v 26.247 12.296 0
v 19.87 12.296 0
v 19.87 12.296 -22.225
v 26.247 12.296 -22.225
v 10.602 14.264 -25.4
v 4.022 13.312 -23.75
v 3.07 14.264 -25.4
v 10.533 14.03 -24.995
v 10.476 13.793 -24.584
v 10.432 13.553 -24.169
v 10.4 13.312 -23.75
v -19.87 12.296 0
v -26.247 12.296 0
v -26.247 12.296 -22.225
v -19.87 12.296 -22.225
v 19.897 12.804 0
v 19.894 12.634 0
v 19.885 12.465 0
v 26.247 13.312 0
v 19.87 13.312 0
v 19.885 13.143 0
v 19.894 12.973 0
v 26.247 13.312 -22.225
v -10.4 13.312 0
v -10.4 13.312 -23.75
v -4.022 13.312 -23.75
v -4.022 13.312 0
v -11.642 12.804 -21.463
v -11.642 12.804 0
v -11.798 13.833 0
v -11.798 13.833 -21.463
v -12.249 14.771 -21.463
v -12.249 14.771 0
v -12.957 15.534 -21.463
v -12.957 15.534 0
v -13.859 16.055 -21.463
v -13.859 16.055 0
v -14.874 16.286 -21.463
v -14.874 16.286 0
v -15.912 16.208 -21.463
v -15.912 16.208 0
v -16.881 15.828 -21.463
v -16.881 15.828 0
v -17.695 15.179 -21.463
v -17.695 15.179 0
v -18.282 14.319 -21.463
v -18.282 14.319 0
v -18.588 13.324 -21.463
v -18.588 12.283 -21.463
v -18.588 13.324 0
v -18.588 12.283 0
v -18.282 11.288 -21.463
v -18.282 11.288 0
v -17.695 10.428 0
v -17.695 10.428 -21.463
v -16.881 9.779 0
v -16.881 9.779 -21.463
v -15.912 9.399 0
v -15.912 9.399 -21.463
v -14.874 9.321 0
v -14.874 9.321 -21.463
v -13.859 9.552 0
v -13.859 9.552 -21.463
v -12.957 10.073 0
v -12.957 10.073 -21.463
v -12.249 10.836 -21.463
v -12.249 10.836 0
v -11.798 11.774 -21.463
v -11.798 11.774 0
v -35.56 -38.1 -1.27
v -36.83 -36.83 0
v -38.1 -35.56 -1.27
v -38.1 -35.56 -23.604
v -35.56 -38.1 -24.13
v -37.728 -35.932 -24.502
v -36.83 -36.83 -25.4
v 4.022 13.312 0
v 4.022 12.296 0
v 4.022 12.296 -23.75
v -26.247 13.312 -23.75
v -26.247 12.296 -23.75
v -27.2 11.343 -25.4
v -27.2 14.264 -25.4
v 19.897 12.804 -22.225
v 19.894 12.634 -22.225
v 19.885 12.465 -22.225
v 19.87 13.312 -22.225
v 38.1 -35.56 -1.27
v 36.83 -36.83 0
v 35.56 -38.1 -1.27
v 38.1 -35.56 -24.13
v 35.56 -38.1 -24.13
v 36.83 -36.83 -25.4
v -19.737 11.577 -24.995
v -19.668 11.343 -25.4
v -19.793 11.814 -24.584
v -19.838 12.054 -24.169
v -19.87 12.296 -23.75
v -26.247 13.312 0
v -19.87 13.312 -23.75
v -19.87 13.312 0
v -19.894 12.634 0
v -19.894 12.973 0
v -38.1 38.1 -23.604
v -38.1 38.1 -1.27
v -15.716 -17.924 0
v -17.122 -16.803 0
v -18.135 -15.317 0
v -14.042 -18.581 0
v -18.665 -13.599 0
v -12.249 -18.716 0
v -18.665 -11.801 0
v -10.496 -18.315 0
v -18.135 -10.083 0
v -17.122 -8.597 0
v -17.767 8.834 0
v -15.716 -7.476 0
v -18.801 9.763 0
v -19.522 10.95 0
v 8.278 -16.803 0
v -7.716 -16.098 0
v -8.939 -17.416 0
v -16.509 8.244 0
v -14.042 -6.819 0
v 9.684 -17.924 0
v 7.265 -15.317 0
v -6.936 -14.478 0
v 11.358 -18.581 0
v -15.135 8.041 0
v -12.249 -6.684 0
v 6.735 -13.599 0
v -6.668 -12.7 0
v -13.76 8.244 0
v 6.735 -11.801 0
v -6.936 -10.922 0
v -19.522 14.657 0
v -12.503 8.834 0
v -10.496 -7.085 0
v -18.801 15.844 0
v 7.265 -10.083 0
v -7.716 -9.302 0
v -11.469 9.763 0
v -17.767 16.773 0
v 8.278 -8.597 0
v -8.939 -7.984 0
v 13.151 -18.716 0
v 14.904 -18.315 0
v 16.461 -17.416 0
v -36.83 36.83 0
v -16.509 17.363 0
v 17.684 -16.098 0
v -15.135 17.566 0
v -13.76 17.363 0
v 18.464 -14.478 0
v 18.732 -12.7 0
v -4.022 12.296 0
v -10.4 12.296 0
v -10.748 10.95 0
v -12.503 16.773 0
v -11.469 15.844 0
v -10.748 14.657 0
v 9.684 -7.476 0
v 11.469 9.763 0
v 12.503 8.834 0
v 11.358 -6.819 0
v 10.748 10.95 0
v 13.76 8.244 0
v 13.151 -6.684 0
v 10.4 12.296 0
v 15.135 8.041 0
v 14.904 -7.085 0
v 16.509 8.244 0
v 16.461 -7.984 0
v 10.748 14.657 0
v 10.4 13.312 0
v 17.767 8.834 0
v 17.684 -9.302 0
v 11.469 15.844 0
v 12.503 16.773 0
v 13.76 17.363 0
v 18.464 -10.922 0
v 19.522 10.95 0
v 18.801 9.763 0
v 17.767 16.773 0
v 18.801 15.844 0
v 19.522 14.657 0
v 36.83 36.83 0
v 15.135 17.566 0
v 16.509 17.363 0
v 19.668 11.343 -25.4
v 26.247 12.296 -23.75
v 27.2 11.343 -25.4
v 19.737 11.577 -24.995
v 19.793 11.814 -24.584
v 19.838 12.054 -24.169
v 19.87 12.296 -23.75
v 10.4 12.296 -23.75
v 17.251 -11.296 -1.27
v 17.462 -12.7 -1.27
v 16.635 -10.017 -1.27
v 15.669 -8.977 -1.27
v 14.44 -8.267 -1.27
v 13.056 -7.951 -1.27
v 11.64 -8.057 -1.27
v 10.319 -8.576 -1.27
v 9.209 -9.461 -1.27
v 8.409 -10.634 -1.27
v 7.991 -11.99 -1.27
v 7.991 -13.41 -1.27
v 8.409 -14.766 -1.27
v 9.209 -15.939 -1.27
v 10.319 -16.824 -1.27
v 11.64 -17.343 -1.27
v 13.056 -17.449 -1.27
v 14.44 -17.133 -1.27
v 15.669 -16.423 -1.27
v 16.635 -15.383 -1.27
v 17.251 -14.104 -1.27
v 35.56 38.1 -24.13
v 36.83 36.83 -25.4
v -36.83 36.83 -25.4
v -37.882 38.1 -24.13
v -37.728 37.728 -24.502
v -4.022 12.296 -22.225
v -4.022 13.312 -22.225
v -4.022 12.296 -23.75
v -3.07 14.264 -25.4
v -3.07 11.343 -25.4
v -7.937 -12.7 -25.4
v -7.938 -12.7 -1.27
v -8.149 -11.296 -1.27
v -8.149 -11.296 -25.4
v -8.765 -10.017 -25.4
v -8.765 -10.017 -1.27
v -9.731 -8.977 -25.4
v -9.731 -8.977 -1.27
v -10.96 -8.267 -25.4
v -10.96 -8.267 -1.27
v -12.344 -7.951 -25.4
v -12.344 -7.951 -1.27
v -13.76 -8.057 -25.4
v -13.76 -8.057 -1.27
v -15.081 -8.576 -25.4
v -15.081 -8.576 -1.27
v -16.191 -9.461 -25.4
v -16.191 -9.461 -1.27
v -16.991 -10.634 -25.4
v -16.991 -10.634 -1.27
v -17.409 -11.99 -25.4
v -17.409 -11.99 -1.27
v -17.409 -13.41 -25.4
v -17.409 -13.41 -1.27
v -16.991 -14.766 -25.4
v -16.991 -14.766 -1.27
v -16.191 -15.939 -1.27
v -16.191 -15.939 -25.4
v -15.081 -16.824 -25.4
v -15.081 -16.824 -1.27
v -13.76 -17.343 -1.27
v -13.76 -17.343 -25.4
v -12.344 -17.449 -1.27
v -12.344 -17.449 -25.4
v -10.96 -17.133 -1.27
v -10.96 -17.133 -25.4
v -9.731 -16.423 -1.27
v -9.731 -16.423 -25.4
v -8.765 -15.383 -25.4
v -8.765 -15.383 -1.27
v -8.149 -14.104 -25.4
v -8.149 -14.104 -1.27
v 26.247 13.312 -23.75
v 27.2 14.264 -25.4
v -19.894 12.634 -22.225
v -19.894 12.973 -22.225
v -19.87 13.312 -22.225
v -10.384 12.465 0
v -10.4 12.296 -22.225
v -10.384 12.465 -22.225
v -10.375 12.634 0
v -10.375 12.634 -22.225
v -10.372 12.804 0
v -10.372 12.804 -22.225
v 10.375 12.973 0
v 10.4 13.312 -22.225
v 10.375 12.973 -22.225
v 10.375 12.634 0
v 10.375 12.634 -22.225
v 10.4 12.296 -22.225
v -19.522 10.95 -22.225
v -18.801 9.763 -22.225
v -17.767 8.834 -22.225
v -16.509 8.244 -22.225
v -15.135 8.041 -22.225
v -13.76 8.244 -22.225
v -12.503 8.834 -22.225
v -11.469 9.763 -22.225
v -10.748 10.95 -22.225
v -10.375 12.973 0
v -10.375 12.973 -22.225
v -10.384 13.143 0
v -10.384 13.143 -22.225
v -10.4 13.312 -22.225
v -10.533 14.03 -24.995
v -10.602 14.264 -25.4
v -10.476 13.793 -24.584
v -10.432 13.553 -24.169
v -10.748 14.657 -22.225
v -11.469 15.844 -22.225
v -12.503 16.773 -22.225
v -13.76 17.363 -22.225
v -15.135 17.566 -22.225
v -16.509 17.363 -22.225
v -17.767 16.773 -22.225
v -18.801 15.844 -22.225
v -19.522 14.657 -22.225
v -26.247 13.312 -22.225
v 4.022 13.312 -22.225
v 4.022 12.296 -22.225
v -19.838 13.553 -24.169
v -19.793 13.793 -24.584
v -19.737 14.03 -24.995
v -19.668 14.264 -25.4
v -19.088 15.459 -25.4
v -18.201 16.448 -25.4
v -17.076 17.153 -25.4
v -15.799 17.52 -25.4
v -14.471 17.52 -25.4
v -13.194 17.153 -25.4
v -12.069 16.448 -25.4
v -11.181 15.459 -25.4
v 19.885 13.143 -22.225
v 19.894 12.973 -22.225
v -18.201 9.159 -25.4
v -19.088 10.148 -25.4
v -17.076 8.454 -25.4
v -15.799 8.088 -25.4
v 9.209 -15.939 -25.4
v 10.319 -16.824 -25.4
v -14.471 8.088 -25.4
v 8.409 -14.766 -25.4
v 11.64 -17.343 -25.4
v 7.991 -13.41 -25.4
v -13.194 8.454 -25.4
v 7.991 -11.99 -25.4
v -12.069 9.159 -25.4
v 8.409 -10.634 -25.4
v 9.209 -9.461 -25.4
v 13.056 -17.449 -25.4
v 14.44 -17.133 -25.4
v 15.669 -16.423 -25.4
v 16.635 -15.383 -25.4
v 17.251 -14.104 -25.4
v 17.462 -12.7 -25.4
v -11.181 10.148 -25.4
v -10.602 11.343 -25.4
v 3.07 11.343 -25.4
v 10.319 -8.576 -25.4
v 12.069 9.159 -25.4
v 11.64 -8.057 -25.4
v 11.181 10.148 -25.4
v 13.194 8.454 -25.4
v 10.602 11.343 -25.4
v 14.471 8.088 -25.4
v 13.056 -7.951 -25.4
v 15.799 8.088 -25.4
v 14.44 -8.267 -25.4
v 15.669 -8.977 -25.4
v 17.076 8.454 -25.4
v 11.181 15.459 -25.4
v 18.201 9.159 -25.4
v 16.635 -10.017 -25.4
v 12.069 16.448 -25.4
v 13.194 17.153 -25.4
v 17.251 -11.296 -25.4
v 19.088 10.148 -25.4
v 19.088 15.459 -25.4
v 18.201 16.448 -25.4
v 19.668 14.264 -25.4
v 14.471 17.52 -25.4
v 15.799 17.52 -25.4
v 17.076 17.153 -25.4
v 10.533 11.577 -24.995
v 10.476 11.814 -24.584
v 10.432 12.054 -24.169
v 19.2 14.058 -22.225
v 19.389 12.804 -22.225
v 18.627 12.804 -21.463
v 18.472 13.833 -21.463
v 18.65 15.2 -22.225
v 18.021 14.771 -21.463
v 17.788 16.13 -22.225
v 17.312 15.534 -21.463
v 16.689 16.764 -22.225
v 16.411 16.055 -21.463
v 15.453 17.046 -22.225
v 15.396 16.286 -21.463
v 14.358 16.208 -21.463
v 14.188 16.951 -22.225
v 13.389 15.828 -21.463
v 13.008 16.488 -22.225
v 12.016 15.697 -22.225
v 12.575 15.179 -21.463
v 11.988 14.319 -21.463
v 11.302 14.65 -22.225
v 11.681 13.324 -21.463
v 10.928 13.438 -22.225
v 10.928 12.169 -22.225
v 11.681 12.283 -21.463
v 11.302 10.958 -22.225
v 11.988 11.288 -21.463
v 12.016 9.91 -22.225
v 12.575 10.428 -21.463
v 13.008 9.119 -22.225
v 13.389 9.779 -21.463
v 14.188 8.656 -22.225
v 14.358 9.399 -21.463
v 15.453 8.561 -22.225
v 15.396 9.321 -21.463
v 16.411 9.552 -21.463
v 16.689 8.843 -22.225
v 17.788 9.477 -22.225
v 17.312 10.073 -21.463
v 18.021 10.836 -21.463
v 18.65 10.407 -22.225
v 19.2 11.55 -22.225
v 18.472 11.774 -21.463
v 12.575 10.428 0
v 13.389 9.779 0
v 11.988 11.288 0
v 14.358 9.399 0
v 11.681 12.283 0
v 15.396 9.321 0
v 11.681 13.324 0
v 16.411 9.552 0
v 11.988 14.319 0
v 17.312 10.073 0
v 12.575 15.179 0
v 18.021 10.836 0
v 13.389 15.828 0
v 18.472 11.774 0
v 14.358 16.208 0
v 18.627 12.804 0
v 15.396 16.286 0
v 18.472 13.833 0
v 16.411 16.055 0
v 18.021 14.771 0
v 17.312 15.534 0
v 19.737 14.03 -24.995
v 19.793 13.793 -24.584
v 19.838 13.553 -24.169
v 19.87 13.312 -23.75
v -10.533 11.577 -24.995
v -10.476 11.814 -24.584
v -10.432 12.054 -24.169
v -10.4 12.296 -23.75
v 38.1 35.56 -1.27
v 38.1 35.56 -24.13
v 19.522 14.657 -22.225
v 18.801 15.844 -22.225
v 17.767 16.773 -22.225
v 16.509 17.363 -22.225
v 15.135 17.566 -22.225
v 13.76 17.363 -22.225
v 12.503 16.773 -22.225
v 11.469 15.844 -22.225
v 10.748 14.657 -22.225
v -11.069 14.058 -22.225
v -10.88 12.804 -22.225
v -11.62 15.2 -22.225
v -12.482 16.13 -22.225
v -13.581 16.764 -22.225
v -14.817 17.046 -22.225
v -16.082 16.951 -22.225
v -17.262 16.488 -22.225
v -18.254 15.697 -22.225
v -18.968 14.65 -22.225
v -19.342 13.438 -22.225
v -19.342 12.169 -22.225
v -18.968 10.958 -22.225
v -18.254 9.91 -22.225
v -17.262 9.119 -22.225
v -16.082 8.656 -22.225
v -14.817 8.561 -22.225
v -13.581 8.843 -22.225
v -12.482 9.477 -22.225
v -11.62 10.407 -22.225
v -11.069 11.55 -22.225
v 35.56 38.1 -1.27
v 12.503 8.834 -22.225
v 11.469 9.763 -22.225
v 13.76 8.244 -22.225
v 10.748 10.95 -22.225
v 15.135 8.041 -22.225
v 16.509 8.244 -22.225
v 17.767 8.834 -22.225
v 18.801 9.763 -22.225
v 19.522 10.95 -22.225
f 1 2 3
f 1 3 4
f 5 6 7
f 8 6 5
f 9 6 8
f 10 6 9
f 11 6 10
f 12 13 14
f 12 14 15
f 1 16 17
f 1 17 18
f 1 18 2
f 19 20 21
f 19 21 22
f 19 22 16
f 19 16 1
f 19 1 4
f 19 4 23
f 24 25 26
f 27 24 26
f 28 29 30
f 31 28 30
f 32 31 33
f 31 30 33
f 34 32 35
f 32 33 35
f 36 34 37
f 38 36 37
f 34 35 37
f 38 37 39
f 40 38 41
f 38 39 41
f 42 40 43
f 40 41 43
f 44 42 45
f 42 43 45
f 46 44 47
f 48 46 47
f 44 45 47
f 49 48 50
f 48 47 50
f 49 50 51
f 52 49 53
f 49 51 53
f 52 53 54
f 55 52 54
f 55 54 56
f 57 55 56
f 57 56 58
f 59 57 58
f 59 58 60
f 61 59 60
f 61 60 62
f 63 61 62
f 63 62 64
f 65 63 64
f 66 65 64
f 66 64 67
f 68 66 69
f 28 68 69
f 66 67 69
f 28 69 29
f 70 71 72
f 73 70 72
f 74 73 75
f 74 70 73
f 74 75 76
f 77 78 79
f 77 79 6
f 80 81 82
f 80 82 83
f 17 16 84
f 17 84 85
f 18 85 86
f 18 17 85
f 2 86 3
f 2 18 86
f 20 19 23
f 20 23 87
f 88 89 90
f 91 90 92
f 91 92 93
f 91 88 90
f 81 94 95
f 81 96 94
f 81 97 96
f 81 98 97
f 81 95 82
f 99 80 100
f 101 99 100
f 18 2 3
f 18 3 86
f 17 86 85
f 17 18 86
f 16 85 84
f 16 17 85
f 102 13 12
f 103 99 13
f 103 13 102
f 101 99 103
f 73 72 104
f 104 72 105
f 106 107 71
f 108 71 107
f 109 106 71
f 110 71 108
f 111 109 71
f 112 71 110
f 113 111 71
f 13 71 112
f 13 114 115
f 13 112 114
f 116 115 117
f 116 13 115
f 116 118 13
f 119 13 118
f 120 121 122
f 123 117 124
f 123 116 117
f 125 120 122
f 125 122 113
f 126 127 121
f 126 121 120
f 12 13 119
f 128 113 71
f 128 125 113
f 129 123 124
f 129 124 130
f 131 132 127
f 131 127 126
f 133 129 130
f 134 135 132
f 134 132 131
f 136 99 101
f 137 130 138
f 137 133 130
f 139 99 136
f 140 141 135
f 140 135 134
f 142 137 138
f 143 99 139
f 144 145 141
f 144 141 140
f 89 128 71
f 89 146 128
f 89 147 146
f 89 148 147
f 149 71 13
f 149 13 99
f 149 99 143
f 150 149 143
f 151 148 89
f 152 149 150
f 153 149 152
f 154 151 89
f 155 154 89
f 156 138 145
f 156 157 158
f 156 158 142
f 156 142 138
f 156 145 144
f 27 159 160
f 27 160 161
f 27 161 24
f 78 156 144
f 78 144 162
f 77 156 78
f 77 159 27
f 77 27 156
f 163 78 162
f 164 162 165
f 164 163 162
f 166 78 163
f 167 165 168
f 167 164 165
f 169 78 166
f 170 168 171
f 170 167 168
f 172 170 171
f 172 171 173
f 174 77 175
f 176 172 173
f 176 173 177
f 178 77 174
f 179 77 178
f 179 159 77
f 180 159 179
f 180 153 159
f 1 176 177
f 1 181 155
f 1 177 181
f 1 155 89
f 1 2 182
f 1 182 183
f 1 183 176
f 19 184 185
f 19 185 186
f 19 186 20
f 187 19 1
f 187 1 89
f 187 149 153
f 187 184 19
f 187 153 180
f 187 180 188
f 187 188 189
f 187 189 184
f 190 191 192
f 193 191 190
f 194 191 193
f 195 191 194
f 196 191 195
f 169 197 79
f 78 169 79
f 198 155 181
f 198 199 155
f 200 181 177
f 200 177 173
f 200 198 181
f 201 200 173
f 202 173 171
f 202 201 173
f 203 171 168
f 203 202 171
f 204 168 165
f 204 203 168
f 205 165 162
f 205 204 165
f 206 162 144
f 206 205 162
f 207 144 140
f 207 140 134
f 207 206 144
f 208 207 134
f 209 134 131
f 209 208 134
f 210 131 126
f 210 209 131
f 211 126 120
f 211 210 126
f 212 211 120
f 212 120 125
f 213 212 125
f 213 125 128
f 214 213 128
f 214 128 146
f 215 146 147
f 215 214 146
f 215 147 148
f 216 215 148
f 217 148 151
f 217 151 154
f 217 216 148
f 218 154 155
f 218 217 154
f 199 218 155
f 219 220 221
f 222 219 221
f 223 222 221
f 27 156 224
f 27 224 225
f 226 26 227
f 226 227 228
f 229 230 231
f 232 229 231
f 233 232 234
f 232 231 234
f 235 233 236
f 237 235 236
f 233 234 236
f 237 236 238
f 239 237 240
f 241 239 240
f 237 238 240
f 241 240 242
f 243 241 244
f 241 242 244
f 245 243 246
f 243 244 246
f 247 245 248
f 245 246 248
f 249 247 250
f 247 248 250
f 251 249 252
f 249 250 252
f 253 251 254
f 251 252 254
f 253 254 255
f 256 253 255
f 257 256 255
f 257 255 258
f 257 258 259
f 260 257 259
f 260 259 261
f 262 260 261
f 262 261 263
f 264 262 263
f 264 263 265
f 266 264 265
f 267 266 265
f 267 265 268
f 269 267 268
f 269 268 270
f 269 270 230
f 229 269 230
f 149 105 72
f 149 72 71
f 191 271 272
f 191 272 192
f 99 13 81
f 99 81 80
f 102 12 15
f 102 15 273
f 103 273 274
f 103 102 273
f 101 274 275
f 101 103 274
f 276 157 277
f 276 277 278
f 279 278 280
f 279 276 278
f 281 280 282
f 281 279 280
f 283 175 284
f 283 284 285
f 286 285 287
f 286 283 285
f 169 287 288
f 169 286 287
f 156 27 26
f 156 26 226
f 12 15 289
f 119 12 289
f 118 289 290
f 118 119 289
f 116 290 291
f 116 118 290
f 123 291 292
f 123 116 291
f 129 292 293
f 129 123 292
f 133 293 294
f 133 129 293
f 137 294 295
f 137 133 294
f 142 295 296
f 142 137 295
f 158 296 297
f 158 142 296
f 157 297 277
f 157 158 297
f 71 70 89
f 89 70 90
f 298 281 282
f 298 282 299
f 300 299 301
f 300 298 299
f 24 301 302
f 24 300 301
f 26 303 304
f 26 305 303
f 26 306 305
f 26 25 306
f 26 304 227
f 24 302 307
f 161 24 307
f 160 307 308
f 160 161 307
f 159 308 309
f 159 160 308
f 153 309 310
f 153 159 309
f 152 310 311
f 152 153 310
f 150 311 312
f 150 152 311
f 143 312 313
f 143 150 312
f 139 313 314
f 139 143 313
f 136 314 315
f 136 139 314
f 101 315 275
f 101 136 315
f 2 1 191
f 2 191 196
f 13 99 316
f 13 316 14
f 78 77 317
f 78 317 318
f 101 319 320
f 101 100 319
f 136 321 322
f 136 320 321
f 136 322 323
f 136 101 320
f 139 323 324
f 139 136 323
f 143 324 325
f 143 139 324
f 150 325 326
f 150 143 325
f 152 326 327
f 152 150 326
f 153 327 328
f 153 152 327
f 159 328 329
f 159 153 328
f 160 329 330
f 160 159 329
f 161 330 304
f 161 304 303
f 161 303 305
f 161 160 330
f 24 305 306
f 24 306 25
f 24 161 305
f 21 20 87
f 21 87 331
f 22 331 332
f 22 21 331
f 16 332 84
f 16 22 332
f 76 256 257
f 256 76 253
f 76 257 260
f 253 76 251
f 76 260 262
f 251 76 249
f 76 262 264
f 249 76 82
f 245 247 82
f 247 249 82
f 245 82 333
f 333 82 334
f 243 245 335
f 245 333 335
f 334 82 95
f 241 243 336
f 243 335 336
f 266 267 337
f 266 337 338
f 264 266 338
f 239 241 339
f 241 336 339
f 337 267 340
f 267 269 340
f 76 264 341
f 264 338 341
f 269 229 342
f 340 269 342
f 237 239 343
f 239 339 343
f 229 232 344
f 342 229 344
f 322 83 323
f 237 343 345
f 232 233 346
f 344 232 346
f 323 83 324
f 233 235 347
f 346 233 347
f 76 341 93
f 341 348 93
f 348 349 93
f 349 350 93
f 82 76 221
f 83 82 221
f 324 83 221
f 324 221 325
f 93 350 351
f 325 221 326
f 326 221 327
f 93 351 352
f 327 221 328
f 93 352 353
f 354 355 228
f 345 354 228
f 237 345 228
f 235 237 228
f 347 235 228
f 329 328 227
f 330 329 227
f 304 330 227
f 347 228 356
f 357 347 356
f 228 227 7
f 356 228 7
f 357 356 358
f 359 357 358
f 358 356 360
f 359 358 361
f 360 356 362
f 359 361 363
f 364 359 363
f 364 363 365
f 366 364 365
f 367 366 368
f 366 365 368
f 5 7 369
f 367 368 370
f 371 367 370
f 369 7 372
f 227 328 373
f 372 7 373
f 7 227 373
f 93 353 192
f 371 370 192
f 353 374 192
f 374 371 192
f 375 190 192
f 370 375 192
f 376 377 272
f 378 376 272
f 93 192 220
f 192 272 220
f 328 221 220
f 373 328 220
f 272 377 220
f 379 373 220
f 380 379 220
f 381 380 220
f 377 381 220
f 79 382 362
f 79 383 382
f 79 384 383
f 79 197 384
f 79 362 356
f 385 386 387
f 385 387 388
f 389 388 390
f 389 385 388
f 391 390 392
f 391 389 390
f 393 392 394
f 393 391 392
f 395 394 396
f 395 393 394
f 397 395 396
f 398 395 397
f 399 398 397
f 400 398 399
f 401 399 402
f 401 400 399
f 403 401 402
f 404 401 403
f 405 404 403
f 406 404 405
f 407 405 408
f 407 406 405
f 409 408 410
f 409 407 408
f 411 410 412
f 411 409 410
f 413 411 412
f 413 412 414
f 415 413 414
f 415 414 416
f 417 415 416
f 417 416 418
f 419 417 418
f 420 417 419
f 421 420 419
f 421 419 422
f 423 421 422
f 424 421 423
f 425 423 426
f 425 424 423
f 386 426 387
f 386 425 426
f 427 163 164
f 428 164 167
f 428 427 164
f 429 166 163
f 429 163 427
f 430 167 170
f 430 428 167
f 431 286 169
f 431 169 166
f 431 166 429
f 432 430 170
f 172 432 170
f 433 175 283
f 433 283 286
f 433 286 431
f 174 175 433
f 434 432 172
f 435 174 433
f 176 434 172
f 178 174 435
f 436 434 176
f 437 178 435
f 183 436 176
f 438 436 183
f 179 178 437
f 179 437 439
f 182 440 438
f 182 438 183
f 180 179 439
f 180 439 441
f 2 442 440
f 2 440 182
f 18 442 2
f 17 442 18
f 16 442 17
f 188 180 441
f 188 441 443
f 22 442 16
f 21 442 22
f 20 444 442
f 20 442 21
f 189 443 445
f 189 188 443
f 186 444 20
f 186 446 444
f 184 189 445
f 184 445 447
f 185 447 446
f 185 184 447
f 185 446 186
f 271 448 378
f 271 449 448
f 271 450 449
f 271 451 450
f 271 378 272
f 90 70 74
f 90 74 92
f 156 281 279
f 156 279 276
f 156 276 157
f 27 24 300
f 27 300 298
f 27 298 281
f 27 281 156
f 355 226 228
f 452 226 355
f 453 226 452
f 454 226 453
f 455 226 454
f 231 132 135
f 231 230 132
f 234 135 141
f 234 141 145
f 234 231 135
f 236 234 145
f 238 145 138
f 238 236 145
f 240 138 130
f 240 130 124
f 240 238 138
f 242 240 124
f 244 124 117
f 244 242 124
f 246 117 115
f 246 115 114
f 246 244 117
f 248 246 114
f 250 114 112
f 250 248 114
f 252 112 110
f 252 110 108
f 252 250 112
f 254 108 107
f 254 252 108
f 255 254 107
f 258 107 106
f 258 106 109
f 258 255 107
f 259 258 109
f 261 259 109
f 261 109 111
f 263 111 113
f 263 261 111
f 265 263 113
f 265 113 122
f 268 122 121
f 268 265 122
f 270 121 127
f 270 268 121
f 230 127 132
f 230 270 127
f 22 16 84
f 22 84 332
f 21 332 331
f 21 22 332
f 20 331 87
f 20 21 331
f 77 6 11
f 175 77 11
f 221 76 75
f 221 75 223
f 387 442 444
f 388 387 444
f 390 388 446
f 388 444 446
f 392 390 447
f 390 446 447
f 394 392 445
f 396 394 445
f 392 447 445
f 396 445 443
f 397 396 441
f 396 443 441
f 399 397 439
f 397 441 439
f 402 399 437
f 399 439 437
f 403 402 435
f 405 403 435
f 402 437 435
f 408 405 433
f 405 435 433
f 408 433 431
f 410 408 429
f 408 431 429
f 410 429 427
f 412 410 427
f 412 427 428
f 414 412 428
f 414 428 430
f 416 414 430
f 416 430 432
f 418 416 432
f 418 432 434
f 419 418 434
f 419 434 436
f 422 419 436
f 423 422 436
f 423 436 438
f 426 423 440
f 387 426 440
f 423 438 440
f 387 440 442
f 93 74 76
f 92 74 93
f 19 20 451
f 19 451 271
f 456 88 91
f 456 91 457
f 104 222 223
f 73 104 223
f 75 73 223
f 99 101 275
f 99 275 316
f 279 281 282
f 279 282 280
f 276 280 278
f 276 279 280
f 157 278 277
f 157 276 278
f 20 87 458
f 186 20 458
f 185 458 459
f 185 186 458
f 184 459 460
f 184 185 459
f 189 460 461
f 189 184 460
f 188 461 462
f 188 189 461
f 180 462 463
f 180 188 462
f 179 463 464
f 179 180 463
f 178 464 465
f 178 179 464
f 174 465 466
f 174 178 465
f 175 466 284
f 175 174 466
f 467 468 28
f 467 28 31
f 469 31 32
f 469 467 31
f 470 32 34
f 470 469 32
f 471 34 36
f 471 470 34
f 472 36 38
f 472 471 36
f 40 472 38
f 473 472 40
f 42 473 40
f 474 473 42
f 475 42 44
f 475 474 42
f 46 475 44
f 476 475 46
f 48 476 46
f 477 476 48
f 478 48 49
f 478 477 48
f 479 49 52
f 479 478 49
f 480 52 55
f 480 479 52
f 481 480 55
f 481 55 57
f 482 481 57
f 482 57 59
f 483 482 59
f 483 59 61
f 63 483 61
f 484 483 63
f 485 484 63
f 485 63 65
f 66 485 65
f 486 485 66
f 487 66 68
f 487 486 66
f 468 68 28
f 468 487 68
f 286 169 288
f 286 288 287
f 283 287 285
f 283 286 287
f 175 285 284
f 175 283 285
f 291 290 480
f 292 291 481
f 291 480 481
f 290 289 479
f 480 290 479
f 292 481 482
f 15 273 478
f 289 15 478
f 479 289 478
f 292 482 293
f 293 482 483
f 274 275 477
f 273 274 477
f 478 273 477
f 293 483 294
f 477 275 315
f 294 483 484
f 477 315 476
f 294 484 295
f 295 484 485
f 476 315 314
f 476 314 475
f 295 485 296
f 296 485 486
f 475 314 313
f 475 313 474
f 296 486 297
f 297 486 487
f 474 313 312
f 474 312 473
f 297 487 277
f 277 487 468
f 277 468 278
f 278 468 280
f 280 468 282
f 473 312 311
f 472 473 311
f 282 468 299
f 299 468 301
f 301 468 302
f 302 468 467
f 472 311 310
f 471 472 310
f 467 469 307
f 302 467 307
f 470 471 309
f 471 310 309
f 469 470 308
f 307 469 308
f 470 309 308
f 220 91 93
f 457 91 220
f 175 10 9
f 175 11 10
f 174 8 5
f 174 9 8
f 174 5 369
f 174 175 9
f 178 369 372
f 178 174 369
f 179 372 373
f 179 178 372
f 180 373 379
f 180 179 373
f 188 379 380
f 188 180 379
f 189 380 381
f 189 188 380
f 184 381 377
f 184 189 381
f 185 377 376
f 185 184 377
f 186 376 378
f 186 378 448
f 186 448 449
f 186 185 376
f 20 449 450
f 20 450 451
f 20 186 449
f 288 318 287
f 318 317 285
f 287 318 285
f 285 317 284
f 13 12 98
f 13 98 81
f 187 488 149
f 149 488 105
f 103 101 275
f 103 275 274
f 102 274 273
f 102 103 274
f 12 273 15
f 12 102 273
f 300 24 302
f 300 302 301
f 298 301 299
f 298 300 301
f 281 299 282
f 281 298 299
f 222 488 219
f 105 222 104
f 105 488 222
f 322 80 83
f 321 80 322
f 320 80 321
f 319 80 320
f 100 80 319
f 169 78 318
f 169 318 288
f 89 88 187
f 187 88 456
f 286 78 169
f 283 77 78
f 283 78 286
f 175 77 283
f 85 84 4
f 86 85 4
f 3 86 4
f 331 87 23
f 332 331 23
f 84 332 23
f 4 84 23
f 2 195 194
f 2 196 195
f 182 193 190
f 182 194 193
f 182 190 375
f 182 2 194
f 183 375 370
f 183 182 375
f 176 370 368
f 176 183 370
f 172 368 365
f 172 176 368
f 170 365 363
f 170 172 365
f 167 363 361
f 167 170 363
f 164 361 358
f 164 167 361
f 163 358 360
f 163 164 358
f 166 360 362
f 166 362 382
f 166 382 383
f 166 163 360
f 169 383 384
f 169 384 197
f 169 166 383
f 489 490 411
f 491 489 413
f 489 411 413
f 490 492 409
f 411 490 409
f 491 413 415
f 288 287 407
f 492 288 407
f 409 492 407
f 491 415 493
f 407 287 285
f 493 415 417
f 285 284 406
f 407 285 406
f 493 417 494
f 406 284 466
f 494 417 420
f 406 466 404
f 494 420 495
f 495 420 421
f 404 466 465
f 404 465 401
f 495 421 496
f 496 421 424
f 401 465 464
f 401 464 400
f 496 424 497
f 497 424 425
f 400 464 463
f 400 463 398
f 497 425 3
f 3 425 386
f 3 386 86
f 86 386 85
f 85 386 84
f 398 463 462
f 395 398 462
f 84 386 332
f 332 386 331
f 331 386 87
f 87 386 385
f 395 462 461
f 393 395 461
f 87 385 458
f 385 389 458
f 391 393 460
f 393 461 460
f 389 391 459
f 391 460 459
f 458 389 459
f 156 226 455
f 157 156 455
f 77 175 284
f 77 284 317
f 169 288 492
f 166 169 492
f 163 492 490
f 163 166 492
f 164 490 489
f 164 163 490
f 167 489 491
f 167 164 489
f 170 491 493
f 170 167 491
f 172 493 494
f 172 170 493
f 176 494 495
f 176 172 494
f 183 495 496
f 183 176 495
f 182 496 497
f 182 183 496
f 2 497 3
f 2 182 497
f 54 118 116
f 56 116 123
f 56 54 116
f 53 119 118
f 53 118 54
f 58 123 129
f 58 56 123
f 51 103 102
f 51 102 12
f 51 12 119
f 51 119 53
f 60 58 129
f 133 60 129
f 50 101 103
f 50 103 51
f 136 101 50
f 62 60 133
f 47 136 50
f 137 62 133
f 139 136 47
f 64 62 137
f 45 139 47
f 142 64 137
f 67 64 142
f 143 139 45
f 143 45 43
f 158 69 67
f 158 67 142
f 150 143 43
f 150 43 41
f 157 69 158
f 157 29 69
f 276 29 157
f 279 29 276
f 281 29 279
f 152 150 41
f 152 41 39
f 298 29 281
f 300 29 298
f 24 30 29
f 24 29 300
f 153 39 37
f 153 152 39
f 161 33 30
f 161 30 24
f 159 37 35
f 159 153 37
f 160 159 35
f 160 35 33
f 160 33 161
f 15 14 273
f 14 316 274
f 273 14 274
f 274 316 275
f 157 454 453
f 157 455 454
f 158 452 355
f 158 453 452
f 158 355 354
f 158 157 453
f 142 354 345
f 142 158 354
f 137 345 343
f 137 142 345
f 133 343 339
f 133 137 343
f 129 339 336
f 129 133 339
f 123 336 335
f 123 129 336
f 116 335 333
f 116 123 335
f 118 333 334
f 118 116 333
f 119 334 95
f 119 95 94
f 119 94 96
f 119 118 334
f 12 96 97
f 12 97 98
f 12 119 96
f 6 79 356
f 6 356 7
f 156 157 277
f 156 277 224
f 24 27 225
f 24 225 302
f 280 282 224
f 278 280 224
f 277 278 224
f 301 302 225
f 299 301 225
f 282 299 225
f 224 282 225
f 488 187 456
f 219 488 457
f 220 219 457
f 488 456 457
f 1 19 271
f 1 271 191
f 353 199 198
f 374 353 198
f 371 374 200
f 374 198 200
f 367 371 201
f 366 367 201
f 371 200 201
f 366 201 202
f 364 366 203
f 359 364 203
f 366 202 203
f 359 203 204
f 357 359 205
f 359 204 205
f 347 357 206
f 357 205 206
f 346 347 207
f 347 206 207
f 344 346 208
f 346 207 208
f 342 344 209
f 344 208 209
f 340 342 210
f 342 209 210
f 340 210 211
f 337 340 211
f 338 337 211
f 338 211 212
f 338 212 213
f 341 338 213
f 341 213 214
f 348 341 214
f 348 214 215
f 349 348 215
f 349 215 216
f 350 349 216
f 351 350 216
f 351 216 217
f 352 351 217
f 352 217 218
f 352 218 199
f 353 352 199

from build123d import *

# Parameters (mm, degrees)
F0_W        = 38.1
F0_H        = 76.2
F0_R        = 4.7625
F1_DEPTH    = 25.4
F2_SIZE     = 2.54
F3_SIZE     = 1.26999
F4_T1_DEPTH = 78.9220847894
F4_T3_DEPTH = 76.5265699849
F0_R_2      = 3.4925
F5_DEPTH    = 22.225
F6_DEPTH    = 22.225
F7_DEPTH    = 22.225
F8_SIZE     = 0.762
F8_2_SIZE   = 0.762
F9_SIZE2    = 1.6497783942
F9_SIZE     = 0.9525


# Not quite as in the source:
# - a fillet or chamfer that OpenCascade refuses, or shapes differently, is made with other operations: its cross-section is extruded or revolved along the edge and cut away or added
# - a fillet or chamfer is up to 0.001 mm smaller than in the source, because OpenCascade refuses the exact size


with BuildPart() as f1:
    # F0 (on Top) → F1 (new body)
    with BuildSketch(Plane.XY):
        with Locations((-19.05, 0)):
            Rectangle(F0_W, F0_H)
        with Locations((-12.7, -12.7)):
            Circle(F0_R, mode=Mode.SUBTRACT)
        with BuildLine():
            ThreePointArc((-19.8702153916, 13.3115481797), (-15.134886232, 17.5660481797), (-10.3995570724, 13.3115481797))
            Line((-10.3995570724, 13.3115481797), (-4.022386232, 13.3115481797))
            Line((-4.022386232, 13.3115481797), (-4.022386232, 12.2955481797))
            Line((-4.022386232, 12.2955481797), (-10.3995570724, 12.2955481797))
            ThreePointArc((-10.3995570724, 12.2955481797), (-15.134886232, 8.0410481797), (-19.8702153916, 12.2955481797))
            Line((-19.8702153916, 12.2955481797), (-26.247386232, 12.2955481797))
            Line((-26.247386232, 12.2955481797), (-26.247386232, 13.3115481797))
            Line((-26.247386232, 13.3115481797), (-19.8702153916, 13.3115481797))
        make_face(mode=Mode.SUBTRACT)
        with Locations((19.05, 0)):
            Rectangle(F0_W, F0_H)
        with Locations((12.7, -12.7)):
            Circle(F0_R, mode=Mode.SUBTRACT)
        with BuildLine():
            ThreePointArc((10.3995570724, 13.3115481797), (15.134886232, 17.5660481797), (19.8702153916, 13.3115481797))
            Line((19.8702153916, 13.3115481797), (26.247386232, 13.3115481797))
            Line((26.247386232, 13.3115481797), (26.247386232, 12.2955481797))
            Line((26.247386232, 12.2955481797), (19.8702153916, 12.2955481797))
            ThreePointArc((19.8702153916, 12.2955481797), (15.134886232, 8.0410481797), (10.3995570724, 12.2955481797))
            Line((10.3995570724, 12.2955481797), (4.022386232, 12.2955481797))
            Line((4.022386232, 12.2955481797), (4.022386232, 13.3115481797))
            Line((4.022386232, 13.3115481797), (10.3995570724, 13.3115481797))
        make_face(mode=Mode.SUBTRACT)
    extrude(amount=-F1_DEPTH)

    # F2
    f2_edges = [f1.edges().sort_by_distance(p)[0] for p in [
        (38.1, -38.1, -12.7),
        (38.1, 38.1, -12.7),
        (-38.1, -38.1, -12.7),
    ]]
    chamfer(f2_edges, length=F2_SIZE)

    # F3 (size 1.27 in the source; OpenCascade refuses exactly that, so slightly less here)
    f3_edges = [f1.edges().sort_by_distance(p)[0] for p in [
        (0, -38.1, 0),
        (-1.27, 38.1, 0),
        (38.1, 0, 0),
        (38.1, 0, -25.4),
        (0, -38.1, -25.4),
        (-1.27, 38.1, -25.4),
        (-38.1, 1.27, -25.4),
    ]]
    chamfer(f3_edges, length=F3_SIZE)

    # F4: chamfer of 1.27 on 4 edges, made by hand

    # F4_s2 → F4_t1 (cut)
    with BuildSketch(Plane.XZ.offset(-40.0960473947)):
        Polygon((-38.1, -1.27), (-36.83, 0), (-38.1, 0), align=None)
    extrude(amount=F4_T1_DEPTH, mode=Mode.SUBTRACT)

    # F4_s4 → F4_t3 (cut)
    with BuildSketch(Plane.XZ.offset(-39.5332849925)):
        Polygon((-38.1, -23.6039587758), (-37.7280256121, -24.5019843879), (-38.1, -24.13001), align=None)
    extrude(amount=F4_T3_DEPTH, mode=Mode.SUBTRACT)

    # F4_s5 → F4_t6 (revolve, cut)
    with BuildSketch(Plane.XZ.offset(12.7)):
        Polygon((-6.6675, 0), (-7.9375, -1.27), (-7.9375, 0), align=None)
    revolve(axis=Axis((-12.7, -12.7, 0), (0, 0, 1)), mode=Mode.SUBTRACT)

    # F4_s7 → F4_t8 (revolve, cut)
    with BuildSketch(Plane.XZ.offset(12.7)):
        Polygon((18.7325, 0), (17.4625, -1.27), (17.4625, 0), align=None)
    revolve(axis=Axis((12.7, -12.7, 0), (0, 0, 1)), mode=Mode.SUBTRACT)

    # F9
    f9_edges = [f1.edges().sort_by_distance(p)[0] for p in [
        (-23.058801, 12.295548, -25.4),
        (-26.247386, 12.803548, -25.4),
        (-23.058801, 13.311548, -25.4),
        (-7.210972, 12.295548, -25.4),
        (-4.022386, 12.803548, -25.4),
        (-7.210972, 13.311548, -25.4),
        (7.210972, 12.295548, -25.4),
        (4.022386, 12.803548, -25.4),
        (7.210972, 13.311548, -25.4),
        (23.058801, 12.295548, -25.4),
        (23.058801, 13.311548, -25.4),
        (26.247386, 12.803548, -25.4),
    ]]
    f9_side = f1.faces().sort_by_distance((0, -0.067575, -25.4))[0]
    chamfer(f9_edges, length=F9_SIZE, length2=F9_SIZE2, reference=f9_side)


with BuildPart() as f5:
    # F0 (on Top) → F5 (new body)
    with BuildSketch(Plane.XY):
        with BuildLine():
            ThreePointArc((19.8702153916, 12.2955481797), (19.8905886708, 12.549185125), (19.897386232, 12.8035481797))
            ThreePointArc((19.897386232, 12.8035481797), (19.8905886708, 13.0579112345), (19.8702153916, 13.3115481797))
            ThreePointArc((19.8702153916, 13.3115481797), (15.134886232, 17.5660481797), (10.3995570724, 13.3115481797))
            ThreePointArc((10.3995570724, 13.3115481797), (10.372386232, 12.8035481797), (10.3995570724, 12.2955481797))
            ThreePointArc((10.3995570724, 12.2955481797), (15.134886232, 8.0410481797), (19.8702153916, 12.2955481797))
        make_face()
        with Locations((15.134886232, 12.8035481797)):
            Circle(F0_R_2, mode=Mode.SUBTRACT)
    extrude(amount=-F5_DEPTH)

    # F8
    f8_edges = [f5.edges().sort_by_distance(p)[0] for p in [
        (11.642386, 12.803548, -22.225),
    ]]
    chamfer(f8_edges, length=F8_SIZE)


with BuildPart() as f5b:
    # F0 (on Top) → F5, piece 2 (new body)
    with BuildSketch(Plane.XY):
        with BuildLine():
            ThreePointArc((-10.3995570724, 12.2955481797), (-10.3791837932, 12.549185125), (-10.372386232, 12.8035481797))
            ThreePointArc((-10.372386232, 12.8035481797), (-10.3791837932, 13.0579112345), (-10.3995570724, 13.3115481797))
            ThreePointArc((-10.3995570724, 13.3115481797), (-15.134886232, 17.5660481797), (-19.8702153916, 13.3115481797))
            ThreePointArc((-19.8702153916, 13.3115481797), (-19.897386232, 12.8035481797), (-19.8702153916, 12.2955481797))
            ThreePointArc((-19.8702153916, 12.2955481797), (-15.134886232, 8.0410481797), (-10.3995570724, 12.2955481797))
        make_face()
        with Locations((-15.134886232, 12.8035481797)):
            Circle(F0_R_2, mode=Mode.SUBTRACT)
    extrude(amount=-F5_DEPTH)

    # F8#2
    f8_2_edges = [f5b.edges().sort_by_distance(p)[0] for p in [
        (-18.627386, 12.803548, -22.225),
    ]]
    chamfer(f8_2_edges, length=F8_2_SIZE)


with BuildPart() as f6:
    # F0 (on Top) → F6 (new body)
    with BuildSketch(Plane.XY):
        with BuildLine():
            ThreePointArc((-10.3995570724, 13.3115481797), (-10.3791837932, 13.0579112345), (-10.372386232, 12.8035481797))
            ThreePointArc((-10.372386232, 12.8035481797), (-10.3791837932, 12.549185125), (-10.3995570724, 12.2955481797))
            Line((-10.3995570724, 12.2955481797), (-4.022386232, 12.2955481797))
            Line((-4.022386232, 12.2955481797), (-4.022386232, 13.3115481797))
            Line((-4.022386232, 13.3115481797), (-10.3995570724, 13.3115481797))
        make_face()
    extrude(amount=-F6_DEPTH)


with BuildPart() as f6b:
    # F0 (on Top) → F6, piece 2 (new body)
    with BuildSketch(Plane.XY):
        with BuildLine():
            ThreePointArc((-19.8702153916, 12.2955481797), (-19.897386232, 12.8035481797), (-19.8702153916, 13.3115481797))
            Line((-19.8702153916, 13.3115481797), (-26.247386232, 13.3115481797))
            Line((-26.247386232, 13.3115481797), (-26.247386232, 12.2955481797))
            Line((-26.247386232, 12.2955481797), (-19.8702153916, 12.2955481797))
        make_face()
    extrude(amount=-F6_DEPTH)


with BuildPart() as f7:
    # F0 (on Top) → F7 (new body)
    with BuildSketch(Plane.XY):
        with BuildLine():
            ThreePointArc((10.3995570724, 12.2955481797), (10.372386232, 12.8035481797), (10.3995570724, 13.3115481797))
            Line((10.3995570724, 13.3115481797), (4.022386232, 13.3115481797))
            Line((4.022386232, 13.3115481797), (4.022386232, 12.2955481797))
            Line((4.022386232, 12.2955481797), (10.3995570724, 12.2955481797))
        make_face()
    extrude(amount=-F7_DEPTH)


with BuildPart() as f7b:
    # F0 (on Top) → F7, piece 2 (new body)
    with BuildSketch(Plane.XY):
        with BuildLine():
            ThreePointArc((19.8702153916, 13.3115481797), (19.8905886708, 13.0579112345), (19.897386232, 12.8035481797))
            ThreePointArc((19.897386232, 12.8035481797), (19.8905886708, 12.549185125), (19.8702153916, 12.2955481797))
            Line((19.8702153916, 12.2955481797), (26.247386232, 12.2955481797))
            Line((26.247386232, 12.2955481797), (26.247386232, 13.3115481797))
            Line((26.247386232, 13.3115481797), (19.8702153916, 13.3115481797))
        make_face()
    extrude(amount=-F7_DEPTH)


solid = Compound([f1.part, f5.part, f5b.part, f6.part, f6b.part, f7.part, f7b.part])
